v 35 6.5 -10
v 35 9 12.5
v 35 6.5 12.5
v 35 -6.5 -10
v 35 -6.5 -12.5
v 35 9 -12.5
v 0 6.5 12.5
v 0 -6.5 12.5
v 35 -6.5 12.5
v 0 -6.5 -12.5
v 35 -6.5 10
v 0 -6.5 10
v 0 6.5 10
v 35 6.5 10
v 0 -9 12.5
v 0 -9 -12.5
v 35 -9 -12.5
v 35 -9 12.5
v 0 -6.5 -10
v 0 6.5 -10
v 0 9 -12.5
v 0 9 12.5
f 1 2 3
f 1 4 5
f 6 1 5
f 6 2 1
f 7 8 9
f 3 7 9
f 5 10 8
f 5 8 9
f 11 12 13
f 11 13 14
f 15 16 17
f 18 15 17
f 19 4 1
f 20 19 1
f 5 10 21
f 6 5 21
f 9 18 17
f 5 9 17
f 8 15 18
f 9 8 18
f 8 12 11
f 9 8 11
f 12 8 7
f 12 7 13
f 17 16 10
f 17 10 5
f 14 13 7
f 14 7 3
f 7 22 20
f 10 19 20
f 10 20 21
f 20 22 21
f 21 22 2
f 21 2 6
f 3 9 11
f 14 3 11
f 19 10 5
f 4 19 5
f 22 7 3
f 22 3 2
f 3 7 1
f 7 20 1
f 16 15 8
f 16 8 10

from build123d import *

# Parameters (mm, degrees)
SKETCH1_W           = 25
SKETCH1_H           = 18
BOSS_EXTRUDE1_DEPTH = 35
SHELL1_T            = -2.5
SPLIT1_START        = -9
SPLIT1_OUTLINE_W    = 35
SPLIT1_OUTLINE_H    = 25
SPLIT1_DEPTH        = 2.5
SPLIT1_START_2      = -6.5
SPLIT1_2_OUTLINE_W  = 35
SPLIT1_2_OUTLINE_H  = 2.5
SPLIT1_2_DEPTH      = 13
SPLIT1_3_OUTLINE_W  = 35
SPLIT1_3_OUTLINE_H  = 2.5
SPLIT1_3_DEPTH      = 13
SPLIT1_4_OUTLINE_W  = 35
SPLIT1_4_OUTLINE_H  = 25
SPLIT1_4_DEPTH      = 2.5


# Read off the part's stored shape, not the designer's step: Split1
with BuildPart() as part:
    # Sketch1 → Boss-Extrude1 (new body)
    with BuildSketch(Plane(origin=(0, 0, 0), x_dir=(0, 0, -1), z_dir=(1, 0, 0))):
        Rectangle(SKETCH1_W, SKETCH1_H)
    extrude(amount=BOSS_EXTRUDE1_DEPTH)

    # Shell1
    shell1_openings = [part.faces().sort_by_distance(p)[0] for p in [
        (35, 0, 0),
        (0, 0, 0),
    ]]
    offset(amount=SHELL1_T, openings=shell1_openings, kind=Kind.INTERSECTION)

    # Split1 outline → Split1 (cut)
    with BuildSketch(Plane(origin=(0, 0, 0), x_dir=(1, 0, 0), z_dir=(0, 1, 0)).offset(SPLIT1_START)):
        with Locations((17.5, 0)):
            Rectangle(SPLIT1_OUTLINE_W, SPLIT1_OUTLINE_H)
    extrude(amount=SPLIT1_DEPTH, mode=Mode.SUBTRACT)

    # Split1 2 outline → Split1 2 (cut)
    with BuildSketch(Plane(origin=(0, 0, 0), x_dir=(1, 0, 0), z_dir=(0, 1, 0)).offset(SPLIT1_START_2)):
        with Locations((17.5, -11.25)):
            Rectangle(SPLIT1_2_OUTLINE_W, SPLIT1_2_OUTLINE_H)
    extrude(amount=SPLIT1_2_DEPTH, mode=Mode.SUBTRACT)


with BuildPart() as body_2:
    # Split1 3 outline → Split1 3 (new body)
    with BuildSketch(Plane(origin=(0, 0, 0), x_dir=(1, 0, 0), z_dir=(0, 1, 0)).offset(SPLIT1_START_2)):
        with Locations((17.5, -11.25)):
            Rectangle(SPLIT1_3_OUTLINE_W, SPLIT1_3_OUTLINE_H)
    extrude(amount=SPLIT1_3_DEPTH)


with BuildPart() as body_3:
    # Split1 4 outline → Split1 4 (new body)
    with BuildSketch(Plane(origin=(0, 0, 0), x_dir=(1, 0, 0), z_dir=(0, 1, 0)).offset(SPLIT1_START)):
        with Locations((17.5, 0)):
            Rectangle(SPLIT1_4_OUTLINE_W, SPLIT1_4_OUTLINE_H)
    extrude(amount=SPLIT1_4_DEPTH)


solid = Compound([part.part, body_2.part, body_3.part])
